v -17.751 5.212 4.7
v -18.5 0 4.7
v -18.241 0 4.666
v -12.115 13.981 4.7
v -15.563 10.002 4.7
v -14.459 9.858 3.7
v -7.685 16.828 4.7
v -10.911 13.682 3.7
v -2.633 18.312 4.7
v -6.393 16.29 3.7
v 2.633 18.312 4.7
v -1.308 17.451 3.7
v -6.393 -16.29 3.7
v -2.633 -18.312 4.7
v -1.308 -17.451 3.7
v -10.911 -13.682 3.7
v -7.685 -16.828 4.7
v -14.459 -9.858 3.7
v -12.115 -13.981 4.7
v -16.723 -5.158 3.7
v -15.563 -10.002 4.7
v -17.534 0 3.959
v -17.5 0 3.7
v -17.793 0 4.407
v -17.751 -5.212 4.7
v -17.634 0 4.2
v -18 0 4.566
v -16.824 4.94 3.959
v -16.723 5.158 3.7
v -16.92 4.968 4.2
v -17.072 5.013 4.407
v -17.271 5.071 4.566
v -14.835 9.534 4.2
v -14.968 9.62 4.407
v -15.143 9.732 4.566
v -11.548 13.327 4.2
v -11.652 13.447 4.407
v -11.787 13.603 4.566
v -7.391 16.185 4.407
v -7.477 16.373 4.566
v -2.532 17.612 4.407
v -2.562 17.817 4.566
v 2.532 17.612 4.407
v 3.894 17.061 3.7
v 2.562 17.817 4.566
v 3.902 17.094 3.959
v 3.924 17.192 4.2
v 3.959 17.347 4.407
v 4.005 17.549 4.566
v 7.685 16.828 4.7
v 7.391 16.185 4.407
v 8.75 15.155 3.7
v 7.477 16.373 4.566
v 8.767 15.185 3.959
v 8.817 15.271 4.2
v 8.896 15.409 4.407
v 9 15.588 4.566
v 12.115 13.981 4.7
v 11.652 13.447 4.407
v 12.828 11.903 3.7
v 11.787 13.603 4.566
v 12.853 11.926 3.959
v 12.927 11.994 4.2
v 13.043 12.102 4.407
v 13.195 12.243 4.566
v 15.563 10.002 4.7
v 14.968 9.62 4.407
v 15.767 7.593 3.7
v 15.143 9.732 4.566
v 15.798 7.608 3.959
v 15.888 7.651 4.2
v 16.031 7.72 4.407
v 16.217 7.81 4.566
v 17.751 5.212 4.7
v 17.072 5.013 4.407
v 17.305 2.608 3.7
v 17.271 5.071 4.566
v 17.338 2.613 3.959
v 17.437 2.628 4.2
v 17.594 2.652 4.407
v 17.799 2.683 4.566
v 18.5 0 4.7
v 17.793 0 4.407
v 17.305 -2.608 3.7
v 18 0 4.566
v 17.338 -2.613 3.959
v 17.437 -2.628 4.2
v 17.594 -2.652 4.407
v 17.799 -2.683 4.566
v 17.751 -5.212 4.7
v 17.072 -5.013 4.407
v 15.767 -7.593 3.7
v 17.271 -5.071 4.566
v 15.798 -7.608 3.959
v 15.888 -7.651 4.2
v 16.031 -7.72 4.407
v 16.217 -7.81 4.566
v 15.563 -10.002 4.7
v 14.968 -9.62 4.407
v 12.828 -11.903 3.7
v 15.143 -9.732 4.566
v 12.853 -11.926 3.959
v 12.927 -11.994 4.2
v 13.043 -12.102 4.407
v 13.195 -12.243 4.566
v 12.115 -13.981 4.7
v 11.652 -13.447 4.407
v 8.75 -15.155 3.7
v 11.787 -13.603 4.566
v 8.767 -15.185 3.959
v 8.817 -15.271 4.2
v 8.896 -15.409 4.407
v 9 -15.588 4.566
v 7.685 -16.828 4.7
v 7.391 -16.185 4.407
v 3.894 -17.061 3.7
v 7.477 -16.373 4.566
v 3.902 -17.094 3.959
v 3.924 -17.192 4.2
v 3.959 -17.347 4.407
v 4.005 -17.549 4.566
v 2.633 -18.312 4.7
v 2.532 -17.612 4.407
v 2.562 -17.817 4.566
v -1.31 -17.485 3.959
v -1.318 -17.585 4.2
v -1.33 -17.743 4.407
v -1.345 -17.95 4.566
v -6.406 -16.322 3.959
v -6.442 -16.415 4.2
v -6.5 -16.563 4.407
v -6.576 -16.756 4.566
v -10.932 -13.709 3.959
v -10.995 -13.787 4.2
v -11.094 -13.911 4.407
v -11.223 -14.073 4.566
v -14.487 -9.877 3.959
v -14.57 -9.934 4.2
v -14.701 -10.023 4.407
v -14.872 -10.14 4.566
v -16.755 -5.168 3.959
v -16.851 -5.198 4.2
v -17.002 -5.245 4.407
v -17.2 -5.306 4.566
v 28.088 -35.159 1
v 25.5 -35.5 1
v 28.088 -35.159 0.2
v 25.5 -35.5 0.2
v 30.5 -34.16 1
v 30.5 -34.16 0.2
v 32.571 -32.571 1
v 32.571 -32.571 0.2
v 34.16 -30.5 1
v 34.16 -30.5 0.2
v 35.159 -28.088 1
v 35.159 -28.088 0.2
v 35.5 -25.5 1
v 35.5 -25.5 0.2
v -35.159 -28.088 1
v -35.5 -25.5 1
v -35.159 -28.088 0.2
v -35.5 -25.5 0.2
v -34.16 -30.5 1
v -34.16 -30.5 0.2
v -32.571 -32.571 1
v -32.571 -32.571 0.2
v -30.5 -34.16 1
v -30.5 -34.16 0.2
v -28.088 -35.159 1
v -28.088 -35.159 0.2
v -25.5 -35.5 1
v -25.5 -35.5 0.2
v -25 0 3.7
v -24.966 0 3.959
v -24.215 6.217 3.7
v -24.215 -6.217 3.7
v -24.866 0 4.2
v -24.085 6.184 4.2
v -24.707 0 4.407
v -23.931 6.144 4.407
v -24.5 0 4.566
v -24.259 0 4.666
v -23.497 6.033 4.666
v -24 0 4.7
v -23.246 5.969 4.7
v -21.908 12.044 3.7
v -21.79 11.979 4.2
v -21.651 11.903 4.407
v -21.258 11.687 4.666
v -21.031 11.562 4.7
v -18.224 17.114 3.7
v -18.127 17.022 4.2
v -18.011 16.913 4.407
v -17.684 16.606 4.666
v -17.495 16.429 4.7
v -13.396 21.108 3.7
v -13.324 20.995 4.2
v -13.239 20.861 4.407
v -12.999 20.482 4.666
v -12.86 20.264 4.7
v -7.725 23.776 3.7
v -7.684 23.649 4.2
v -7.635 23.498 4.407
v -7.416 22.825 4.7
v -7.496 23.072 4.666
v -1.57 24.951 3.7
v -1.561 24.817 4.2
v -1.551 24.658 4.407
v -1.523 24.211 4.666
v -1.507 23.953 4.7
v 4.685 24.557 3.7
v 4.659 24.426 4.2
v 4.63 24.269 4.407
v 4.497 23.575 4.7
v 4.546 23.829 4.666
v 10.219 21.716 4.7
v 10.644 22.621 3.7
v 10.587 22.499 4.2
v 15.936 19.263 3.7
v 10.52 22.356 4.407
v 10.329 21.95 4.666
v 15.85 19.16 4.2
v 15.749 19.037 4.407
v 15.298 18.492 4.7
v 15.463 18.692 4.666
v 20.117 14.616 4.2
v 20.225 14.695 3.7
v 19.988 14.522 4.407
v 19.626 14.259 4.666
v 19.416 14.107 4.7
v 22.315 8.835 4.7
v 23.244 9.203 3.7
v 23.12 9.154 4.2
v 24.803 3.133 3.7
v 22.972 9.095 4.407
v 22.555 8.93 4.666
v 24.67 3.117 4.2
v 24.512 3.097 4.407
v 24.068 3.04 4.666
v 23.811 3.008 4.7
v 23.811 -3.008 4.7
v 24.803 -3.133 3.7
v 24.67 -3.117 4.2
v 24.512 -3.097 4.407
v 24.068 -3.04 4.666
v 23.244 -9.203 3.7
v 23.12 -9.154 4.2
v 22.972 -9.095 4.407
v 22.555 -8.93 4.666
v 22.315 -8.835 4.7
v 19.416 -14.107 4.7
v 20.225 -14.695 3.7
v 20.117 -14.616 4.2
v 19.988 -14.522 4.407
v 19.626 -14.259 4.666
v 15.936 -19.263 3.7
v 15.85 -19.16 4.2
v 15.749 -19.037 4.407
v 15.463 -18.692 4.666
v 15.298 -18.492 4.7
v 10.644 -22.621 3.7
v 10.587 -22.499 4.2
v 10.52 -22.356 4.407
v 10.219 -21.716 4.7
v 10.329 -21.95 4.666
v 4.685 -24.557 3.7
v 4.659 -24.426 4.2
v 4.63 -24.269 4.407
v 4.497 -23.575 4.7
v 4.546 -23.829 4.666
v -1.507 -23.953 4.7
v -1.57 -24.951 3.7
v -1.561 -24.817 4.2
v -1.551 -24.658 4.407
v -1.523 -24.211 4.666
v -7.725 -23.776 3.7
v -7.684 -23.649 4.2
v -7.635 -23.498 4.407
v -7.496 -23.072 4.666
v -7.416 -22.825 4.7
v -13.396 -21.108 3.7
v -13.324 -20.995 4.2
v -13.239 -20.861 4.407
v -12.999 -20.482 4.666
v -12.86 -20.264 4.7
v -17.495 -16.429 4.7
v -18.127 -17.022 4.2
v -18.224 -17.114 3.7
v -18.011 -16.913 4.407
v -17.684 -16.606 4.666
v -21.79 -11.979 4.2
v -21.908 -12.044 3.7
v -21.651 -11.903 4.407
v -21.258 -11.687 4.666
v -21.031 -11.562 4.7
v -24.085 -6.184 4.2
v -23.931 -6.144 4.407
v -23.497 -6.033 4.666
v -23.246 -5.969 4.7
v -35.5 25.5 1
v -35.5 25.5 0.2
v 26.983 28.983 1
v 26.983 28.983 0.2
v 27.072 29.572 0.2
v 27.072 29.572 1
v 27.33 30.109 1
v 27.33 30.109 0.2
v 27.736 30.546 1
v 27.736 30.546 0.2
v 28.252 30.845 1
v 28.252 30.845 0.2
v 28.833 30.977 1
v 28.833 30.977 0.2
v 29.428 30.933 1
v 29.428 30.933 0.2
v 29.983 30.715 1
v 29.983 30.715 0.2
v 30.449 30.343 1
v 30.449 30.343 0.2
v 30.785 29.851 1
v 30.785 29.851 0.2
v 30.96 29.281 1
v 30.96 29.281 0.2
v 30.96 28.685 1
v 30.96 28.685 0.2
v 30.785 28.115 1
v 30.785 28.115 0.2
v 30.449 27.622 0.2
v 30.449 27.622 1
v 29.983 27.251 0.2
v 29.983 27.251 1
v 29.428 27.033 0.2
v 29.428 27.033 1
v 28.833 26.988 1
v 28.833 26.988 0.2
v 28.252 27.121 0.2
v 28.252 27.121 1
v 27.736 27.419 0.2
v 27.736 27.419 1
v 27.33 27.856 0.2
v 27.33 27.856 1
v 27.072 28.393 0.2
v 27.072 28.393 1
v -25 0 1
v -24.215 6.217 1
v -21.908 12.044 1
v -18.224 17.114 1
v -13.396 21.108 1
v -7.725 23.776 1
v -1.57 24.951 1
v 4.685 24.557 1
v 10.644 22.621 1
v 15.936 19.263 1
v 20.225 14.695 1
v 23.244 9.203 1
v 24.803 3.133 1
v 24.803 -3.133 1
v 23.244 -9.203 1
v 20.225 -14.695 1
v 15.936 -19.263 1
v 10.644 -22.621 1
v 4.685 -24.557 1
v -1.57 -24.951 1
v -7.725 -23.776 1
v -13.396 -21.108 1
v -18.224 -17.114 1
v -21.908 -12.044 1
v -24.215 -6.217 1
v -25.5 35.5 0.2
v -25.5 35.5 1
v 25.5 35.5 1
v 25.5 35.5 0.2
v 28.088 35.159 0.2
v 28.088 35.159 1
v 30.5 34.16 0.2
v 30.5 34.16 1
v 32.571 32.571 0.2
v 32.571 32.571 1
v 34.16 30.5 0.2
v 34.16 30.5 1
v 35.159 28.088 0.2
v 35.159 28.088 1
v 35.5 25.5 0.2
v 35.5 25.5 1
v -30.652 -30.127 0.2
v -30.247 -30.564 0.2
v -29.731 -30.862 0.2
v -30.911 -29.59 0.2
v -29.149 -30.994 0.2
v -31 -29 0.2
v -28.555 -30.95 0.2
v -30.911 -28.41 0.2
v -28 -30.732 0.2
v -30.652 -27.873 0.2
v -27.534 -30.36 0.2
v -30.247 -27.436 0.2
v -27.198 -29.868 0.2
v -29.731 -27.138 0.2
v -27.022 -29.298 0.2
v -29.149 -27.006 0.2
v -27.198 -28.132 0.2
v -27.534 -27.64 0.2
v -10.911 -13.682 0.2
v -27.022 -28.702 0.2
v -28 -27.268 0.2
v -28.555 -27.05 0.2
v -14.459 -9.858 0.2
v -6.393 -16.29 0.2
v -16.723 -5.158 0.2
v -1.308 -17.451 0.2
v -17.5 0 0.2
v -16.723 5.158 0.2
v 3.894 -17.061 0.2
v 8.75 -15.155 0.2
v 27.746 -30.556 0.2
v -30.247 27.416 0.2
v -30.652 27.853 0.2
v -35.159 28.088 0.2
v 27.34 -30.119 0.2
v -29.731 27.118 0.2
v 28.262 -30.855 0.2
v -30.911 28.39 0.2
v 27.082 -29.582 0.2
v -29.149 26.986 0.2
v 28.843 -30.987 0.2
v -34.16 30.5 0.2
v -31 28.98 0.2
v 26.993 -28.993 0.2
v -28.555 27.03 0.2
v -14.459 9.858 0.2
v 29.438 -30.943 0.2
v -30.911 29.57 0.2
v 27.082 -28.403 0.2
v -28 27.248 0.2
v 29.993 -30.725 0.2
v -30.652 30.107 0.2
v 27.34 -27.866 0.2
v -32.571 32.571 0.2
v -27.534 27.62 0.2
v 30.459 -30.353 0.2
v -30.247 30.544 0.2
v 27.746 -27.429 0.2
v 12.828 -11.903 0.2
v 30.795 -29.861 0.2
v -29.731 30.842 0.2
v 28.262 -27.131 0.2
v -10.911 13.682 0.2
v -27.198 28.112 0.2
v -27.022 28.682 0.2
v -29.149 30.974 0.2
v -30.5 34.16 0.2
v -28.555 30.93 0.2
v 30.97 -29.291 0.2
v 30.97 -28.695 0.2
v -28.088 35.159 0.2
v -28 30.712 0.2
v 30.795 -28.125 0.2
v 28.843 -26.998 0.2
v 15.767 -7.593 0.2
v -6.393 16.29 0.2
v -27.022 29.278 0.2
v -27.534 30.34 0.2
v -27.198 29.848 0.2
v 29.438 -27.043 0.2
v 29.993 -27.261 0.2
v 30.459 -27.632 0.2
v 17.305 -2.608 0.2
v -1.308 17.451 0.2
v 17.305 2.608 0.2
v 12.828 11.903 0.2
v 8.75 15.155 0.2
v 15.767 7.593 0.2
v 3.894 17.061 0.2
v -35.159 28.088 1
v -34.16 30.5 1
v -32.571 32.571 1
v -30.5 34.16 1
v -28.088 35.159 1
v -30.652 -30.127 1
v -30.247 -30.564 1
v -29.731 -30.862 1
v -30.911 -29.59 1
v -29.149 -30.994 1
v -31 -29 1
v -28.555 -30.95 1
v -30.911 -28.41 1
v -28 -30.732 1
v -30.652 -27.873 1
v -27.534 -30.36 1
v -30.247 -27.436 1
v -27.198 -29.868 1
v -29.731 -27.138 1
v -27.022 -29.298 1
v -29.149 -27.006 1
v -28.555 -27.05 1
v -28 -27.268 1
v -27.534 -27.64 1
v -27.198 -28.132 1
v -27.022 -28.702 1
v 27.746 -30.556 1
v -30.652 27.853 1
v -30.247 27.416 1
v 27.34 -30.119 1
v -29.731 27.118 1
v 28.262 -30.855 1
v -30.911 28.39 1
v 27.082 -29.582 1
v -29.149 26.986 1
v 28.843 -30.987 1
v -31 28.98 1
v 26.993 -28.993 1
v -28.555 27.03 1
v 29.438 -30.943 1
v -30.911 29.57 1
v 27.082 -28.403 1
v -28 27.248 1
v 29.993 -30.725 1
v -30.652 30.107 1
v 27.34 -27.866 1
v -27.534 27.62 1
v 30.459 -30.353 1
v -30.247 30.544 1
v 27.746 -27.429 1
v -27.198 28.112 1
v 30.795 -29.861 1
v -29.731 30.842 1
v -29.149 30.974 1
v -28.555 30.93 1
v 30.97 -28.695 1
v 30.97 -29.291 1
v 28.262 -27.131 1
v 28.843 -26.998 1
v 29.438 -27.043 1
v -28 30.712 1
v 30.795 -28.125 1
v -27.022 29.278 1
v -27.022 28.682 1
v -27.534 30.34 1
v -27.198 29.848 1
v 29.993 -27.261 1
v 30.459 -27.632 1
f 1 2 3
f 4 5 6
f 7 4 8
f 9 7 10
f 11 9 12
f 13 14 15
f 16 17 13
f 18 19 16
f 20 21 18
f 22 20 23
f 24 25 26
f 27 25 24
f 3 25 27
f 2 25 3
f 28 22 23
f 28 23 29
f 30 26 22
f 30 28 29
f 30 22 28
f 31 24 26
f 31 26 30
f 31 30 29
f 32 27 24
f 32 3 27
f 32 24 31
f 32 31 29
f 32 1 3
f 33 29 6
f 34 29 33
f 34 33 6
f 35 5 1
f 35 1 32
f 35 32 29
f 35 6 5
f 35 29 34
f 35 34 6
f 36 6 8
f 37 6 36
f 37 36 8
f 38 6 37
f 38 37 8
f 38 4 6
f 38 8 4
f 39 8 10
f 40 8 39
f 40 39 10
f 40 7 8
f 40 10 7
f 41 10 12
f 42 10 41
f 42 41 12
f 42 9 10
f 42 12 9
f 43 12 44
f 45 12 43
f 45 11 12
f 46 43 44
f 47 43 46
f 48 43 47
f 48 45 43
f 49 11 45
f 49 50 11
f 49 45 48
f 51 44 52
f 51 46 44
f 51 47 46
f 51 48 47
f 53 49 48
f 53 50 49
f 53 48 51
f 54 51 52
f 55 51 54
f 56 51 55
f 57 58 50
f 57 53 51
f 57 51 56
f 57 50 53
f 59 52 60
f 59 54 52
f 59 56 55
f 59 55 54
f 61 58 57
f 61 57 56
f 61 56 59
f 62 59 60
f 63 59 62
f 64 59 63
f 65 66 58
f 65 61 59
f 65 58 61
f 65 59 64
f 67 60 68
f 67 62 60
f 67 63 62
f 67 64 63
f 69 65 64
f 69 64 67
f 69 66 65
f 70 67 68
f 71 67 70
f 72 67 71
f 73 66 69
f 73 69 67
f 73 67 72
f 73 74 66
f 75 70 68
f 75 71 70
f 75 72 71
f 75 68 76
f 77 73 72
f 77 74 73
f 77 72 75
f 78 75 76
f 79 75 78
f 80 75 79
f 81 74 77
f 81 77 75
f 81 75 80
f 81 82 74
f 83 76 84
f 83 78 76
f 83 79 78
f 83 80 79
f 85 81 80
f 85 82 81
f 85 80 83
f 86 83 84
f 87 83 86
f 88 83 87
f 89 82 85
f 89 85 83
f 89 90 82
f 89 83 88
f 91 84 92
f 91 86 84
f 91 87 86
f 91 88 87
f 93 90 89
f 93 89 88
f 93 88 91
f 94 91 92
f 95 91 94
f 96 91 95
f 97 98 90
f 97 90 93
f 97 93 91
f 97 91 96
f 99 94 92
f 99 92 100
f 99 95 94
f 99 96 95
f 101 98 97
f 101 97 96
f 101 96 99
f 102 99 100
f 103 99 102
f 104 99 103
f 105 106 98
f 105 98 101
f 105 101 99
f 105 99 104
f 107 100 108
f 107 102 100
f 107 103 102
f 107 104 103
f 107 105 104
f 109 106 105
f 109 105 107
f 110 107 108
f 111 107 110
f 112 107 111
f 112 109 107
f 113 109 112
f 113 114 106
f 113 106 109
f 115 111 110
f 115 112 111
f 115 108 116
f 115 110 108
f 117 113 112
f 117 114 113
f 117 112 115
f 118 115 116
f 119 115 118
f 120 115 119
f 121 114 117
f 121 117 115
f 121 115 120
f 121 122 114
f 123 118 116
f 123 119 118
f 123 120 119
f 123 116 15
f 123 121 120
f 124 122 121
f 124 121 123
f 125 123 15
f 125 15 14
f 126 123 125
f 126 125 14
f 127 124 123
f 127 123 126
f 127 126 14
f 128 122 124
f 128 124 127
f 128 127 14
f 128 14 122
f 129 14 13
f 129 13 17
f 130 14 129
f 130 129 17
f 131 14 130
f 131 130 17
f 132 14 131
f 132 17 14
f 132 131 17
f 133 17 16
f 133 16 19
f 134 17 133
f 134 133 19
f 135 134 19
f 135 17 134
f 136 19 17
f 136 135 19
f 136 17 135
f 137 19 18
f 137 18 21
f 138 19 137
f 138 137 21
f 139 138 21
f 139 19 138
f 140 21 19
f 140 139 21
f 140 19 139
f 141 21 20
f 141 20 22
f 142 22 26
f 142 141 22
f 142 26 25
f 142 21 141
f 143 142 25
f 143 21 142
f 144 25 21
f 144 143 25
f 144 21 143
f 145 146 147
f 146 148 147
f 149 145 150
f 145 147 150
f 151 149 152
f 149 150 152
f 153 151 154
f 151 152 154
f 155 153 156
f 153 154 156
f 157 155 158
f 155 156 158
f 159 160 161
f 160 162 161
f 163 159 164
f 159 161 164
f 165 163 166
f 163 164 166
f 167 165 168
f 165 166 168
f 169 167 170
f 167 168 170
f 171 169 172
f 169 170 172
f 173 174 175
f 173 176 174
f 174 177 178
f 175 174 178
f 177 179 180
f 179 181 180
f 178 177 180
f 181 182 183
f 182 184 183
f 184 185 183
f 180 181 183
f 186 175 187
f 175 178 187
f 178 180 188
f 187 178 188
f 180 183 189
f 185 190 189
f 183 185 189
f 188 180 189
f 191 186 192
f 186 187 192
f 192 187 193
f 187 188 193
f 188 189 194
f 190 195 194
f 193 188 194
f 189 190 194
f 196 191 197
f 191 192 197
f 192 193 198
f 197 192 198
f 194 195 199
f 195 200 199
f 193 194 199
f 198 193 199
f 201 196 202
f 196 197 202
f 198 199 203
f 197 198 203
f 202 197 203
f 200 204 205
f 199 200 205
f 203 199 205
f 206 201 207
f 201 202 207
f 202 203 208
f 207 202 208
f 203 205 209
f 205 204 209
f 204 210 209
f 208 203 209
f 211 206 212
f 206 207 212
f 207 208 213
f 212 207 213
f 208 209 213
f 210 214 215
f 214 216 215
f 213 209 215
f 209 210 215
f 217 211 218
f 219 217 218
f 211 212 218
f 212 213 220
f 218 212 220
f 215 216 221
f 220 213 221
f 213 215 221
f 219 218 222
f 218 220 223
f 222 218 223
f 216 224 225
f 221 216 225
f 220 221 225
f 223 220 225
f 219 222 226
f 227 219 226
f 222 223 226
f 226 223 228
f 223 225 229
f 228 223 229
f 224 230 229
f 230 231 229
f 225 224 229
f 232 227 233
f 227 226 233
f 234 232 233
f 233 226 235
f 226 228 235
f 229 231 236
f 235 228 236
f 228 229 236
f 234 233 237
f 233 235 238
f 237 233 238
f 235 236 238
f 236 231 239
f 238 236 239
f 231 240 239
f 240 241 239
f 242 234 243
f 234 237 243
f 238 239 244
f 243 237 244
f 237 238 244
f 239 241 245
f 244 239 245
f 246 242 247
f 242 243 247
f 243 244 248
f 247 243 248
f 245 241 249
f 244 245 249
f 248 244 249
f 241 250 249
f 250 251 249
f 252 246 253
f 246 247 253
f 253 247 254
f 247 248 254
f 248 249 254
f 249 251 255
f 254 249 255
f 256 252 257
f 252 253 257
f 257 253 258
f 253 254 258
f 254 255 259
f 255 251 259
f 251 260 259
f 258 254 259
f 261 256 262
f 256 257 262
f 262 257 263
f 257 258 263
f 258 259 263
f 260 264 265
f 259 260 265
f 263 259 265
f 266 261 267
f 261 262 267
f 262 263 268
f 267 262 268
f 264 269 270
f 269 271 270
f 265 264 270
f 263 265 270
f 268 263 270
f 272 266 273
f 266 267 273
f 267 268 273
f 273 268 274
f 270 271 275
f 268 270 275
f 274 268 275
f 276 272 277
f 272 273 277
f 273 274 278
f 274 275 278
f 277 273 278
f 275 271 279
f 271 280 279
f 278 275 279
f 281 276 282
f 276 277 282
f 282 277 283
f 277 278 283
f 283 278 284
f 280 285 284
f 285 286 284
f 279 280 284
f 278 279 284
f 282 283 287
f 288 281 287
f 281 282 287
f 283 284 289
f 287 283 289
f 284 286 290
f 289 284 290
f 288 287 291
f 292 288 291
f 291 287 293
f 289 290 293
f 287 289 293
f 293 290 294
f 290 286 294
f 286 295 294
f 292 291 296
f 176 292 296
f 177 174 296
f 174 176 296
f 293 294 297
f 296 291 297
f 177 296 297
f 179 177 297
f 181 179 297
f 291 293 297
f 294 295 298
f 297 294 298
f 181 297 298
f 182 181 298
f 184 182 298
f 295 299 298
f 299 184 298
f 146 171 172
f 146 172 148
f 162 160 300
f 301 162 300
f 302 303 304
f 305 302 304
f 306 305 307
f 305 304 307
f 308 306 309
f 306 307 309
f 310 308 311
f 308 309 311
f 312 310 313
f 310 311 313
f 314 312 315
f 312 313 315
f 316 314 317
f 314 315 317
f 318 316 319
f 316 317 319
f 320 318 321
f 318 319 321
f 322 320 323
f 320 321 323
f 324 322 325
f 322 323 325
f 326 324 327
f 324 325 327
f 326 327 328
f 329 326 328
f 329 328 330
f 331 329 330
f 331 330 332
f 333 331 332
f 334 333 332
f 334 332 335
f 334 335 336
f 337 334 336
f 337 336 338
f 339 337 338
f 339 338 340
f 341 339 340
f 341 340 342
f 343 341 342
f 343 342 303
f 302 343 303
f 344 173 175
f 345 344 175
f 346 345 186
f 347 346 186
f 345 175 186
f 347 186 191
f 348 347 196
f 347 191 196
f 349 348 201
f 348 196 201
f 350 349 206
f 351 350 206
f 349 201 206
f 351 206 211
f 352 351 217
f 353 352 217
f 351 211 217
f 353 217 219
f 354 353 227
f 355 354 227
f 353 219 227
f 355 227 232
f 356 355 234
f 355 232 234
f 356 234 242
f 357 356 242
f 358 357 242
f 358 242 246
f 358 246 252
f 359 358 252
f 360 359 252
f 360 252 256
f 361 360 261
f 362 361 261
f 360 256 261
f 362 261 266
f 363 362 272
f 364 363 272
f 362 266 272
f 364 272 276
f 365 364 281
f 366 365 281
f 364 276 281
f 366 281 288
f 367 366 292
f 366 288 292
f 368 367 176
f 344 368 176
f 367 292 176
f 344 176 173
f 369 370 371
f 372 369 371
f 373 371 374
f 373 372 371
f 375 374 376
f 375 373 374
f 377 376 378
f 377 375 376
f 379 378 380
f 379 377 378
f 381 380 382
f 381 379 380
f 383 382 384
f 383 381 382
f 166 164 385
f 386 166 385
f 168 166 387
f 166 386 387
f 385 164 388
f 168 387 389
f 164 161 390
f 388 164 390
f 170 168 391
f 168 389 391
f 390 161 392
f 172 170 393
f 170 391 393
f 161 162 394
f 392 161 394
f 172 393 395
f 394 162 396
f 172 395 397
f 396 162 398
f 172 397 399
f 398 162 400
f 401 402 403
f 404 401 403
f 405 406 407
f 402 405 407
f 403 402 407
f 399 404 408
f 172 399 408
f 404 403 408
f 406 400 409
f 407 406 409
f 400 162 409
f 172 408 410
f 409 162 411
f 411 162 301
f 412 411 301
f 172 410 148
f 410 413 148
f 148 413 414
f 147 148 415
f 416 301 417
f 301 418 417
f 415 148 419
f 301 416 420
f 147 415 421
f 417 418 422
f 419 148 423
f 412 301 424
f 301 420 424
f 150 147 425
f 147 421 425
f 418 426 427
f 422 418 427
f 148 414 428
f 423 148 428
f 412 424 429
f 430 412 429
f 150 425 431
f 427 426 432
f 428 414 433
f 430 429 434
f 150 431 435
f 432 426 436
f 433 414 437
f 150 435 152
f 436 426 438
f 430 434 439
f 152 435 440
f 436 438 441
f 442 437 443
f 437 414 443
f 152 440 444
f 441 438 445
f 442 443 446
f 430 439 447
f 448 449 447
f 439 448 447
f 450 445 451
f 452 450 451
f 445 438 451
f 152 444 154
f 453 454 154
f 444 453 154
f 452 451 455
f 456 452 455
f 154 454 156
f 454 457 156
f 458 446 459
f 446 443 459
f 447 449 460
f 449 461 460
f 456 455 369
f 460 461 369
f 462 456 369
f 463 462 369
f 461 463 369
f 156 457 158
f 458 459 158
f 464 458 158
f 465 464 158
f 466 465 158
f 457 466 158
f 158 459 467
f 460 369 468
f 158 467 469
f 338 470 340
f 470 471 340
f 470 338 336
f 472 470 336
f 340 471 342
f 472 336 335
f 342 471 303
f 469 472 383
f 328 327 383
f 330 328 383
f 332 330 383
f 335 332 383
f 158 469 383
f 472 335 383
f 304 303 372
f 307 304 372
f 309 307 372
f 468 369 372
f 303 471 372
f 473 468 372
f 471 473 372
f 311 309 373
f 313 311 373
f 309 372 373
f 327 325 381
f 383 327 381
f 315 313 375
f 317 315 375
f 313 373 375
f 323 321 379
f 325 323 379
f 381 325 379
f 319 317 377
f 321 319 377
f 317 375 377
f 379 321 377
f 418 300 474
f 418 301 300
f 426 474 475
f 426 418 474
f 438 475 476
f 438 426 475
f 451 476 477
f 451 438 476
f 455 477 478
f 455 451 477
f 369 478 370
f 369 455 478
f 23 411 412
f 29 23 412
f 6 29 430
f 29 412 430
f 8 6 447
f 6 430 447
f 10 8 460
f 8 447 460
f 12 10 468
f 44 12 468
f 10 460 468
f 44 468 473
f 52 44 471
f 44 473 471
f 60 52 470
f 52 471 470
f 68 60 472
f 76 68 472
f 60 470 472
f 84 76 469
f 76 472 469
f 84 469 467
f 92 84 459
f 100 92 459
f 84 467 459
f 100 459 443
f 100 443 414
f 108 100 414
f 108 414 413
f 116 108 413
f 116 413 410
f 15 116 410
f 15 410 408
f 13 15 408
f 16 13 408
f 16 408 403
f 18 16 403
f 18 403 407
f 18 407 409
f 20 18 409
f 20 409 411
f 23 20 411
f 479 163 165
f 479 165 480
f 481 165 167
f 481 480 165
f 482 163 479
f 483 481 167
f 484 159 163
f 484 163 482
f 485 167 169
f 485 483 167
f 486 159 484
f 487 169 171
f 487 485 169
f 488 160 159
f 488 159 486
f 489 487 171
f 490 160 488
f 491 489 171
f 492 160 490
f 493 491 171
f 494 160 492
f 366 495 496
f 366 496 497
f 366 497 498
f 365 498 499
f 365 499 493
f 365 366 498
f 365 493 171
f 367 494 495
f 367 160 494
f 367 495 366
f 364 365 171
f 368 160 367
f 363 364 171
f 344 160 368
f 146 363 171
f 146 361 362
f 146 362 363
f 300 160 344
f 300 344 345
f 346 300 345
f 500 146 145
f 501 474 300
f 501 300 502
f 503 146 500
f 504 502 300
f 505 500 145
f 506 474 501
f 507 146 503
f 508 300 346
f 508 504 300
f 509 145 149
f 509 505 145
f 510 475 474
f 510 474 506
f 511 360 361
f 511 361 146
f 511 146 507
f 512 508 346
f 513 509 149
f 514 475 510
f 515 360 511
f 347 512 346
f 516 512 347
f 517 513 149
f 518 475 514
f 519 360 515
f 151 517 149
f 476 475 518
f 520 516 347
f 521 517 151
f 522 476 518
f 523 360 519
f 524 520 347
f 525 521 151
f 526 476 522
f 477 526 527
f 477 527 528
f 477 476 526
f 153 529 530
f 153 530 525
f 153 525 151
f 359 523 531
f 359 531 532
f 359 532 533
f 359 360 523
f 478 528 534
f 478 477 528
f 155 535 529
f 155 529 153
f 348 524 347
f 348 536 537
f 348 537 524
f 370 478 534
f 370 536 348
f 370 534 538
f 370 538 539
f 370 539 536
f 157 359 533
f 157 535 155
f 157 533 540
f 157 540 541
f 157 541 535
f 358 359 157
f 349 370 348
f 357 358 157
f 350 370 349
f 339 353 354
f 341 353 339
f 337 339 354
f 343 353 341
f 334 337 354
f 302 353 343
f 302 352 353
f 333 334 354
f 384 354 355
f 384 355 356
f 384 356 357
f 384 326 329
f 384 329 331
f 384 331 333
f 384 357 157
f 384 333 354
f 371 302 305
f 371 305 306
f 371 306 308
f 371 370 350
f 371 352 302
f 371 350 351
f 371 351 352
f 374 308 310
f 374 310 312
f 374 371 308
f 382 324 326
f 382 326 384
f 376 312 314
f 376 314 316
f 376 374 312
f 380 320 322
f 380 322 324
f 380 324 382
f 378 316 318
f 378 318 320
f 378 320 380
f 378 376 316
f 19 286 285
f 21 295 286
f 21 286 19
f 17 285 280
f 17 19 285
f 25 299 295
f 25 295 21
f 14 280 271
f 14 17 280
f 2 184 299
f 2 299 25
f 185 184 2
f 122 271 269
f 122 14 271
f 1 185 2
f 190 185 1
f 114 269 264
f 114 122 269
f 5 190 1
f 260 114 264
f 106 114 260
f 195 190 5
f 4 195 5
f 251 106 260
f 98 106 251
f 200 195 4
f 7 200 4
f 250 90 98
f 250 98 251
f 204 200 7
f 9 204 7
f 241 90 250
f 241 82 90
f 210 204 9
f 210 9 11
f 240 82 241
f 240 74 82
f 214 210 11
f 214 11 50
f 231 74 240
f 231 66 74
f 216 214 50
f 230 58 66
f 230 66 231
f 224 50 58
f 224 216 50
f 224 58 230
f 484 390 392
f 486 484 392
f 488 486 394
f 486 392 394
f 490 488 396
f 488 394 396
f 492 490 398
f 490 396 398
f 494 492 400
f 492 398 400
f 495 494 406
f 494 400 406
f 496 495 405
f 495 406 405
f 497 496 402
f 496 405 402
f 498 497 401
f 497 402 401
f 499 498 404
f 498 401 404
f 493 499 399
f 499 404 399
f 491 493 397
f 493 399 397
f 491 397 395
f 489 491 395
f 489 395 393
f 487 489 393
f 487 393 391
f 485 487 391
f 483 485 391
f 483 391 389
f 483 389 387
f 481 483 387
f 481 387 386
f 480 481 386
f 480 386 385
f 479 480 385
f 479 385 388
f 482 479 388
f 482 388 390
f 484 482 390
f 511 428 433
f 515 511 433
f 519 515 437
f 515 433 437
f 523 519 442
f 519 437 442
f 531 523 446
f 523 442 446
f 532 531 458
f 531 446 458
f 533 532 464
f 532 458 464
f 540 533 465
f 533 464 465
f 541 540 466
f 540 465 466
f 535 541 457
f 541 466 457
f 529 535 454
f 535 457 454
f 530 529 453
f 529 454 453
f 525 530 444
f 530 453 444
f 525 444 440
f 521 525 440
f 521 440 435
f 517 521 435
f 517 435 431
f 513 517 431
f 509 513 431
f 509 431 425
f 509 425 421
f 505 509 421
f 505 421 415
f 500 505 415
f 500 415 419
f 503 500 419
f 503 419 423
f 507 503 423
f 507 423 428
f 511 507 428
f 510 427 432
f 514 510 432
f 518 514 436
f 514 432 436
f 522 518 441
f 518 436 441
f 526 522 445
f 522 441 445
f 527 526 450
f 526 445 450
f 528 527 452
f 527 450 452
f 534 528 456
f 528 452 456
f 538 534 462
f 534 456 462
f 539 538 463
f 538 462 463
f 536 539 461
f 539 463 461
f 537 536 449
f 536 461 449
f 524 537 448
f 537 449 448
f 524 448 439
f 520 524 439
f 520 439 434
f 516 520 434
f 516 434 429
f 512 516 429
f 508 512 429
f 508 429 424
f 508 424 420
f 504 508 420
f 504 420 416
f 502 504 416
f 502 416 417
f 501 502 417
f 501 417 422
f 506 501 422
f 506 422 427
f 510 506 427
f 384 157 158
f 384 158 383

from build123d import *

# Parameters (mm, degrees)
SKETCH_1_W            = 71
SKETCH_1_H            = 71
EXTRUDE_1_DEPTH       = 0.8
SKETCH_2_W            = 25
SKETCH_2_H            = 3.7
HOLE_WIZARD_M30_1_D   = 35
HOLE_WIZARD_4_0_4_1_D = 4
FILLET_1_R            = 1
FILLET_2_R            = 10


with BuildPart() as part:
    # 草图1 → 凸台-拉伸1 (new body)
    with BuildSketch(Plane.XY.offset(1)):
        Rectangle(SKETCH_1_W, SKETCH_1_H)
    extrude(amount=-EXTRUDE_1_DEPTH)

    # 草图2 → 旋转1 (revolve)
    with BuildSketch(Plane.XZ, mode=Mode.PRIVATE) as revolve_1_sk:
        with Locations((12.5, 2.85)):
            Rectangle(SKETCH_2_W, SKETCH_2_H)
    revolve(revolve_1_sk.sketch.rotate(Axis((0, 0, 4.7), (0, 0, -1)), 180), axis=Axis((0, 0, 4.7), (0, 0, -1)))

    # M30 间隙孔1 (through all)
    with Locations(Plane.XY.offset(4.7)):
        with Locations((0, 0)):
            Hole(HOLE_WIZARD_M30_1_D / 2)

    # Ø4.0 (4) 直径孔1 (through all)
    with Locations(Plane.XY.offset(1)):
        with Locations((-29, 28.98), (-29, -29), (28.992753946, -28.992756445), (28.982756057, 28.982756057)):
            Hole(HOLE_WIZARD_4_0_4_1_D / 2)

    # 圆角1
    fillet_1_edges = [part.edges().sort_by_distance(p)[0] for p in [
        (25, 0, 4.7),
        (17.5, 0, 4.7),
    ]]
    fillet(fillet_1_edges, radius=FILLET_1_R)

    # 圆角2
    fillet_2_edges = [part.edges().sort_by_distance(p)[0] for p in [
        (35.5, 35.5, 0.6),
        (35.5, -35.5, 0.6),
        (-35.5, -35.5, 0.6),
        (-35.5, 35.5, 0.6),
    ]]
    fillet(fillet_2_edges, radius=FILLET_2_R)


solid = part.part
